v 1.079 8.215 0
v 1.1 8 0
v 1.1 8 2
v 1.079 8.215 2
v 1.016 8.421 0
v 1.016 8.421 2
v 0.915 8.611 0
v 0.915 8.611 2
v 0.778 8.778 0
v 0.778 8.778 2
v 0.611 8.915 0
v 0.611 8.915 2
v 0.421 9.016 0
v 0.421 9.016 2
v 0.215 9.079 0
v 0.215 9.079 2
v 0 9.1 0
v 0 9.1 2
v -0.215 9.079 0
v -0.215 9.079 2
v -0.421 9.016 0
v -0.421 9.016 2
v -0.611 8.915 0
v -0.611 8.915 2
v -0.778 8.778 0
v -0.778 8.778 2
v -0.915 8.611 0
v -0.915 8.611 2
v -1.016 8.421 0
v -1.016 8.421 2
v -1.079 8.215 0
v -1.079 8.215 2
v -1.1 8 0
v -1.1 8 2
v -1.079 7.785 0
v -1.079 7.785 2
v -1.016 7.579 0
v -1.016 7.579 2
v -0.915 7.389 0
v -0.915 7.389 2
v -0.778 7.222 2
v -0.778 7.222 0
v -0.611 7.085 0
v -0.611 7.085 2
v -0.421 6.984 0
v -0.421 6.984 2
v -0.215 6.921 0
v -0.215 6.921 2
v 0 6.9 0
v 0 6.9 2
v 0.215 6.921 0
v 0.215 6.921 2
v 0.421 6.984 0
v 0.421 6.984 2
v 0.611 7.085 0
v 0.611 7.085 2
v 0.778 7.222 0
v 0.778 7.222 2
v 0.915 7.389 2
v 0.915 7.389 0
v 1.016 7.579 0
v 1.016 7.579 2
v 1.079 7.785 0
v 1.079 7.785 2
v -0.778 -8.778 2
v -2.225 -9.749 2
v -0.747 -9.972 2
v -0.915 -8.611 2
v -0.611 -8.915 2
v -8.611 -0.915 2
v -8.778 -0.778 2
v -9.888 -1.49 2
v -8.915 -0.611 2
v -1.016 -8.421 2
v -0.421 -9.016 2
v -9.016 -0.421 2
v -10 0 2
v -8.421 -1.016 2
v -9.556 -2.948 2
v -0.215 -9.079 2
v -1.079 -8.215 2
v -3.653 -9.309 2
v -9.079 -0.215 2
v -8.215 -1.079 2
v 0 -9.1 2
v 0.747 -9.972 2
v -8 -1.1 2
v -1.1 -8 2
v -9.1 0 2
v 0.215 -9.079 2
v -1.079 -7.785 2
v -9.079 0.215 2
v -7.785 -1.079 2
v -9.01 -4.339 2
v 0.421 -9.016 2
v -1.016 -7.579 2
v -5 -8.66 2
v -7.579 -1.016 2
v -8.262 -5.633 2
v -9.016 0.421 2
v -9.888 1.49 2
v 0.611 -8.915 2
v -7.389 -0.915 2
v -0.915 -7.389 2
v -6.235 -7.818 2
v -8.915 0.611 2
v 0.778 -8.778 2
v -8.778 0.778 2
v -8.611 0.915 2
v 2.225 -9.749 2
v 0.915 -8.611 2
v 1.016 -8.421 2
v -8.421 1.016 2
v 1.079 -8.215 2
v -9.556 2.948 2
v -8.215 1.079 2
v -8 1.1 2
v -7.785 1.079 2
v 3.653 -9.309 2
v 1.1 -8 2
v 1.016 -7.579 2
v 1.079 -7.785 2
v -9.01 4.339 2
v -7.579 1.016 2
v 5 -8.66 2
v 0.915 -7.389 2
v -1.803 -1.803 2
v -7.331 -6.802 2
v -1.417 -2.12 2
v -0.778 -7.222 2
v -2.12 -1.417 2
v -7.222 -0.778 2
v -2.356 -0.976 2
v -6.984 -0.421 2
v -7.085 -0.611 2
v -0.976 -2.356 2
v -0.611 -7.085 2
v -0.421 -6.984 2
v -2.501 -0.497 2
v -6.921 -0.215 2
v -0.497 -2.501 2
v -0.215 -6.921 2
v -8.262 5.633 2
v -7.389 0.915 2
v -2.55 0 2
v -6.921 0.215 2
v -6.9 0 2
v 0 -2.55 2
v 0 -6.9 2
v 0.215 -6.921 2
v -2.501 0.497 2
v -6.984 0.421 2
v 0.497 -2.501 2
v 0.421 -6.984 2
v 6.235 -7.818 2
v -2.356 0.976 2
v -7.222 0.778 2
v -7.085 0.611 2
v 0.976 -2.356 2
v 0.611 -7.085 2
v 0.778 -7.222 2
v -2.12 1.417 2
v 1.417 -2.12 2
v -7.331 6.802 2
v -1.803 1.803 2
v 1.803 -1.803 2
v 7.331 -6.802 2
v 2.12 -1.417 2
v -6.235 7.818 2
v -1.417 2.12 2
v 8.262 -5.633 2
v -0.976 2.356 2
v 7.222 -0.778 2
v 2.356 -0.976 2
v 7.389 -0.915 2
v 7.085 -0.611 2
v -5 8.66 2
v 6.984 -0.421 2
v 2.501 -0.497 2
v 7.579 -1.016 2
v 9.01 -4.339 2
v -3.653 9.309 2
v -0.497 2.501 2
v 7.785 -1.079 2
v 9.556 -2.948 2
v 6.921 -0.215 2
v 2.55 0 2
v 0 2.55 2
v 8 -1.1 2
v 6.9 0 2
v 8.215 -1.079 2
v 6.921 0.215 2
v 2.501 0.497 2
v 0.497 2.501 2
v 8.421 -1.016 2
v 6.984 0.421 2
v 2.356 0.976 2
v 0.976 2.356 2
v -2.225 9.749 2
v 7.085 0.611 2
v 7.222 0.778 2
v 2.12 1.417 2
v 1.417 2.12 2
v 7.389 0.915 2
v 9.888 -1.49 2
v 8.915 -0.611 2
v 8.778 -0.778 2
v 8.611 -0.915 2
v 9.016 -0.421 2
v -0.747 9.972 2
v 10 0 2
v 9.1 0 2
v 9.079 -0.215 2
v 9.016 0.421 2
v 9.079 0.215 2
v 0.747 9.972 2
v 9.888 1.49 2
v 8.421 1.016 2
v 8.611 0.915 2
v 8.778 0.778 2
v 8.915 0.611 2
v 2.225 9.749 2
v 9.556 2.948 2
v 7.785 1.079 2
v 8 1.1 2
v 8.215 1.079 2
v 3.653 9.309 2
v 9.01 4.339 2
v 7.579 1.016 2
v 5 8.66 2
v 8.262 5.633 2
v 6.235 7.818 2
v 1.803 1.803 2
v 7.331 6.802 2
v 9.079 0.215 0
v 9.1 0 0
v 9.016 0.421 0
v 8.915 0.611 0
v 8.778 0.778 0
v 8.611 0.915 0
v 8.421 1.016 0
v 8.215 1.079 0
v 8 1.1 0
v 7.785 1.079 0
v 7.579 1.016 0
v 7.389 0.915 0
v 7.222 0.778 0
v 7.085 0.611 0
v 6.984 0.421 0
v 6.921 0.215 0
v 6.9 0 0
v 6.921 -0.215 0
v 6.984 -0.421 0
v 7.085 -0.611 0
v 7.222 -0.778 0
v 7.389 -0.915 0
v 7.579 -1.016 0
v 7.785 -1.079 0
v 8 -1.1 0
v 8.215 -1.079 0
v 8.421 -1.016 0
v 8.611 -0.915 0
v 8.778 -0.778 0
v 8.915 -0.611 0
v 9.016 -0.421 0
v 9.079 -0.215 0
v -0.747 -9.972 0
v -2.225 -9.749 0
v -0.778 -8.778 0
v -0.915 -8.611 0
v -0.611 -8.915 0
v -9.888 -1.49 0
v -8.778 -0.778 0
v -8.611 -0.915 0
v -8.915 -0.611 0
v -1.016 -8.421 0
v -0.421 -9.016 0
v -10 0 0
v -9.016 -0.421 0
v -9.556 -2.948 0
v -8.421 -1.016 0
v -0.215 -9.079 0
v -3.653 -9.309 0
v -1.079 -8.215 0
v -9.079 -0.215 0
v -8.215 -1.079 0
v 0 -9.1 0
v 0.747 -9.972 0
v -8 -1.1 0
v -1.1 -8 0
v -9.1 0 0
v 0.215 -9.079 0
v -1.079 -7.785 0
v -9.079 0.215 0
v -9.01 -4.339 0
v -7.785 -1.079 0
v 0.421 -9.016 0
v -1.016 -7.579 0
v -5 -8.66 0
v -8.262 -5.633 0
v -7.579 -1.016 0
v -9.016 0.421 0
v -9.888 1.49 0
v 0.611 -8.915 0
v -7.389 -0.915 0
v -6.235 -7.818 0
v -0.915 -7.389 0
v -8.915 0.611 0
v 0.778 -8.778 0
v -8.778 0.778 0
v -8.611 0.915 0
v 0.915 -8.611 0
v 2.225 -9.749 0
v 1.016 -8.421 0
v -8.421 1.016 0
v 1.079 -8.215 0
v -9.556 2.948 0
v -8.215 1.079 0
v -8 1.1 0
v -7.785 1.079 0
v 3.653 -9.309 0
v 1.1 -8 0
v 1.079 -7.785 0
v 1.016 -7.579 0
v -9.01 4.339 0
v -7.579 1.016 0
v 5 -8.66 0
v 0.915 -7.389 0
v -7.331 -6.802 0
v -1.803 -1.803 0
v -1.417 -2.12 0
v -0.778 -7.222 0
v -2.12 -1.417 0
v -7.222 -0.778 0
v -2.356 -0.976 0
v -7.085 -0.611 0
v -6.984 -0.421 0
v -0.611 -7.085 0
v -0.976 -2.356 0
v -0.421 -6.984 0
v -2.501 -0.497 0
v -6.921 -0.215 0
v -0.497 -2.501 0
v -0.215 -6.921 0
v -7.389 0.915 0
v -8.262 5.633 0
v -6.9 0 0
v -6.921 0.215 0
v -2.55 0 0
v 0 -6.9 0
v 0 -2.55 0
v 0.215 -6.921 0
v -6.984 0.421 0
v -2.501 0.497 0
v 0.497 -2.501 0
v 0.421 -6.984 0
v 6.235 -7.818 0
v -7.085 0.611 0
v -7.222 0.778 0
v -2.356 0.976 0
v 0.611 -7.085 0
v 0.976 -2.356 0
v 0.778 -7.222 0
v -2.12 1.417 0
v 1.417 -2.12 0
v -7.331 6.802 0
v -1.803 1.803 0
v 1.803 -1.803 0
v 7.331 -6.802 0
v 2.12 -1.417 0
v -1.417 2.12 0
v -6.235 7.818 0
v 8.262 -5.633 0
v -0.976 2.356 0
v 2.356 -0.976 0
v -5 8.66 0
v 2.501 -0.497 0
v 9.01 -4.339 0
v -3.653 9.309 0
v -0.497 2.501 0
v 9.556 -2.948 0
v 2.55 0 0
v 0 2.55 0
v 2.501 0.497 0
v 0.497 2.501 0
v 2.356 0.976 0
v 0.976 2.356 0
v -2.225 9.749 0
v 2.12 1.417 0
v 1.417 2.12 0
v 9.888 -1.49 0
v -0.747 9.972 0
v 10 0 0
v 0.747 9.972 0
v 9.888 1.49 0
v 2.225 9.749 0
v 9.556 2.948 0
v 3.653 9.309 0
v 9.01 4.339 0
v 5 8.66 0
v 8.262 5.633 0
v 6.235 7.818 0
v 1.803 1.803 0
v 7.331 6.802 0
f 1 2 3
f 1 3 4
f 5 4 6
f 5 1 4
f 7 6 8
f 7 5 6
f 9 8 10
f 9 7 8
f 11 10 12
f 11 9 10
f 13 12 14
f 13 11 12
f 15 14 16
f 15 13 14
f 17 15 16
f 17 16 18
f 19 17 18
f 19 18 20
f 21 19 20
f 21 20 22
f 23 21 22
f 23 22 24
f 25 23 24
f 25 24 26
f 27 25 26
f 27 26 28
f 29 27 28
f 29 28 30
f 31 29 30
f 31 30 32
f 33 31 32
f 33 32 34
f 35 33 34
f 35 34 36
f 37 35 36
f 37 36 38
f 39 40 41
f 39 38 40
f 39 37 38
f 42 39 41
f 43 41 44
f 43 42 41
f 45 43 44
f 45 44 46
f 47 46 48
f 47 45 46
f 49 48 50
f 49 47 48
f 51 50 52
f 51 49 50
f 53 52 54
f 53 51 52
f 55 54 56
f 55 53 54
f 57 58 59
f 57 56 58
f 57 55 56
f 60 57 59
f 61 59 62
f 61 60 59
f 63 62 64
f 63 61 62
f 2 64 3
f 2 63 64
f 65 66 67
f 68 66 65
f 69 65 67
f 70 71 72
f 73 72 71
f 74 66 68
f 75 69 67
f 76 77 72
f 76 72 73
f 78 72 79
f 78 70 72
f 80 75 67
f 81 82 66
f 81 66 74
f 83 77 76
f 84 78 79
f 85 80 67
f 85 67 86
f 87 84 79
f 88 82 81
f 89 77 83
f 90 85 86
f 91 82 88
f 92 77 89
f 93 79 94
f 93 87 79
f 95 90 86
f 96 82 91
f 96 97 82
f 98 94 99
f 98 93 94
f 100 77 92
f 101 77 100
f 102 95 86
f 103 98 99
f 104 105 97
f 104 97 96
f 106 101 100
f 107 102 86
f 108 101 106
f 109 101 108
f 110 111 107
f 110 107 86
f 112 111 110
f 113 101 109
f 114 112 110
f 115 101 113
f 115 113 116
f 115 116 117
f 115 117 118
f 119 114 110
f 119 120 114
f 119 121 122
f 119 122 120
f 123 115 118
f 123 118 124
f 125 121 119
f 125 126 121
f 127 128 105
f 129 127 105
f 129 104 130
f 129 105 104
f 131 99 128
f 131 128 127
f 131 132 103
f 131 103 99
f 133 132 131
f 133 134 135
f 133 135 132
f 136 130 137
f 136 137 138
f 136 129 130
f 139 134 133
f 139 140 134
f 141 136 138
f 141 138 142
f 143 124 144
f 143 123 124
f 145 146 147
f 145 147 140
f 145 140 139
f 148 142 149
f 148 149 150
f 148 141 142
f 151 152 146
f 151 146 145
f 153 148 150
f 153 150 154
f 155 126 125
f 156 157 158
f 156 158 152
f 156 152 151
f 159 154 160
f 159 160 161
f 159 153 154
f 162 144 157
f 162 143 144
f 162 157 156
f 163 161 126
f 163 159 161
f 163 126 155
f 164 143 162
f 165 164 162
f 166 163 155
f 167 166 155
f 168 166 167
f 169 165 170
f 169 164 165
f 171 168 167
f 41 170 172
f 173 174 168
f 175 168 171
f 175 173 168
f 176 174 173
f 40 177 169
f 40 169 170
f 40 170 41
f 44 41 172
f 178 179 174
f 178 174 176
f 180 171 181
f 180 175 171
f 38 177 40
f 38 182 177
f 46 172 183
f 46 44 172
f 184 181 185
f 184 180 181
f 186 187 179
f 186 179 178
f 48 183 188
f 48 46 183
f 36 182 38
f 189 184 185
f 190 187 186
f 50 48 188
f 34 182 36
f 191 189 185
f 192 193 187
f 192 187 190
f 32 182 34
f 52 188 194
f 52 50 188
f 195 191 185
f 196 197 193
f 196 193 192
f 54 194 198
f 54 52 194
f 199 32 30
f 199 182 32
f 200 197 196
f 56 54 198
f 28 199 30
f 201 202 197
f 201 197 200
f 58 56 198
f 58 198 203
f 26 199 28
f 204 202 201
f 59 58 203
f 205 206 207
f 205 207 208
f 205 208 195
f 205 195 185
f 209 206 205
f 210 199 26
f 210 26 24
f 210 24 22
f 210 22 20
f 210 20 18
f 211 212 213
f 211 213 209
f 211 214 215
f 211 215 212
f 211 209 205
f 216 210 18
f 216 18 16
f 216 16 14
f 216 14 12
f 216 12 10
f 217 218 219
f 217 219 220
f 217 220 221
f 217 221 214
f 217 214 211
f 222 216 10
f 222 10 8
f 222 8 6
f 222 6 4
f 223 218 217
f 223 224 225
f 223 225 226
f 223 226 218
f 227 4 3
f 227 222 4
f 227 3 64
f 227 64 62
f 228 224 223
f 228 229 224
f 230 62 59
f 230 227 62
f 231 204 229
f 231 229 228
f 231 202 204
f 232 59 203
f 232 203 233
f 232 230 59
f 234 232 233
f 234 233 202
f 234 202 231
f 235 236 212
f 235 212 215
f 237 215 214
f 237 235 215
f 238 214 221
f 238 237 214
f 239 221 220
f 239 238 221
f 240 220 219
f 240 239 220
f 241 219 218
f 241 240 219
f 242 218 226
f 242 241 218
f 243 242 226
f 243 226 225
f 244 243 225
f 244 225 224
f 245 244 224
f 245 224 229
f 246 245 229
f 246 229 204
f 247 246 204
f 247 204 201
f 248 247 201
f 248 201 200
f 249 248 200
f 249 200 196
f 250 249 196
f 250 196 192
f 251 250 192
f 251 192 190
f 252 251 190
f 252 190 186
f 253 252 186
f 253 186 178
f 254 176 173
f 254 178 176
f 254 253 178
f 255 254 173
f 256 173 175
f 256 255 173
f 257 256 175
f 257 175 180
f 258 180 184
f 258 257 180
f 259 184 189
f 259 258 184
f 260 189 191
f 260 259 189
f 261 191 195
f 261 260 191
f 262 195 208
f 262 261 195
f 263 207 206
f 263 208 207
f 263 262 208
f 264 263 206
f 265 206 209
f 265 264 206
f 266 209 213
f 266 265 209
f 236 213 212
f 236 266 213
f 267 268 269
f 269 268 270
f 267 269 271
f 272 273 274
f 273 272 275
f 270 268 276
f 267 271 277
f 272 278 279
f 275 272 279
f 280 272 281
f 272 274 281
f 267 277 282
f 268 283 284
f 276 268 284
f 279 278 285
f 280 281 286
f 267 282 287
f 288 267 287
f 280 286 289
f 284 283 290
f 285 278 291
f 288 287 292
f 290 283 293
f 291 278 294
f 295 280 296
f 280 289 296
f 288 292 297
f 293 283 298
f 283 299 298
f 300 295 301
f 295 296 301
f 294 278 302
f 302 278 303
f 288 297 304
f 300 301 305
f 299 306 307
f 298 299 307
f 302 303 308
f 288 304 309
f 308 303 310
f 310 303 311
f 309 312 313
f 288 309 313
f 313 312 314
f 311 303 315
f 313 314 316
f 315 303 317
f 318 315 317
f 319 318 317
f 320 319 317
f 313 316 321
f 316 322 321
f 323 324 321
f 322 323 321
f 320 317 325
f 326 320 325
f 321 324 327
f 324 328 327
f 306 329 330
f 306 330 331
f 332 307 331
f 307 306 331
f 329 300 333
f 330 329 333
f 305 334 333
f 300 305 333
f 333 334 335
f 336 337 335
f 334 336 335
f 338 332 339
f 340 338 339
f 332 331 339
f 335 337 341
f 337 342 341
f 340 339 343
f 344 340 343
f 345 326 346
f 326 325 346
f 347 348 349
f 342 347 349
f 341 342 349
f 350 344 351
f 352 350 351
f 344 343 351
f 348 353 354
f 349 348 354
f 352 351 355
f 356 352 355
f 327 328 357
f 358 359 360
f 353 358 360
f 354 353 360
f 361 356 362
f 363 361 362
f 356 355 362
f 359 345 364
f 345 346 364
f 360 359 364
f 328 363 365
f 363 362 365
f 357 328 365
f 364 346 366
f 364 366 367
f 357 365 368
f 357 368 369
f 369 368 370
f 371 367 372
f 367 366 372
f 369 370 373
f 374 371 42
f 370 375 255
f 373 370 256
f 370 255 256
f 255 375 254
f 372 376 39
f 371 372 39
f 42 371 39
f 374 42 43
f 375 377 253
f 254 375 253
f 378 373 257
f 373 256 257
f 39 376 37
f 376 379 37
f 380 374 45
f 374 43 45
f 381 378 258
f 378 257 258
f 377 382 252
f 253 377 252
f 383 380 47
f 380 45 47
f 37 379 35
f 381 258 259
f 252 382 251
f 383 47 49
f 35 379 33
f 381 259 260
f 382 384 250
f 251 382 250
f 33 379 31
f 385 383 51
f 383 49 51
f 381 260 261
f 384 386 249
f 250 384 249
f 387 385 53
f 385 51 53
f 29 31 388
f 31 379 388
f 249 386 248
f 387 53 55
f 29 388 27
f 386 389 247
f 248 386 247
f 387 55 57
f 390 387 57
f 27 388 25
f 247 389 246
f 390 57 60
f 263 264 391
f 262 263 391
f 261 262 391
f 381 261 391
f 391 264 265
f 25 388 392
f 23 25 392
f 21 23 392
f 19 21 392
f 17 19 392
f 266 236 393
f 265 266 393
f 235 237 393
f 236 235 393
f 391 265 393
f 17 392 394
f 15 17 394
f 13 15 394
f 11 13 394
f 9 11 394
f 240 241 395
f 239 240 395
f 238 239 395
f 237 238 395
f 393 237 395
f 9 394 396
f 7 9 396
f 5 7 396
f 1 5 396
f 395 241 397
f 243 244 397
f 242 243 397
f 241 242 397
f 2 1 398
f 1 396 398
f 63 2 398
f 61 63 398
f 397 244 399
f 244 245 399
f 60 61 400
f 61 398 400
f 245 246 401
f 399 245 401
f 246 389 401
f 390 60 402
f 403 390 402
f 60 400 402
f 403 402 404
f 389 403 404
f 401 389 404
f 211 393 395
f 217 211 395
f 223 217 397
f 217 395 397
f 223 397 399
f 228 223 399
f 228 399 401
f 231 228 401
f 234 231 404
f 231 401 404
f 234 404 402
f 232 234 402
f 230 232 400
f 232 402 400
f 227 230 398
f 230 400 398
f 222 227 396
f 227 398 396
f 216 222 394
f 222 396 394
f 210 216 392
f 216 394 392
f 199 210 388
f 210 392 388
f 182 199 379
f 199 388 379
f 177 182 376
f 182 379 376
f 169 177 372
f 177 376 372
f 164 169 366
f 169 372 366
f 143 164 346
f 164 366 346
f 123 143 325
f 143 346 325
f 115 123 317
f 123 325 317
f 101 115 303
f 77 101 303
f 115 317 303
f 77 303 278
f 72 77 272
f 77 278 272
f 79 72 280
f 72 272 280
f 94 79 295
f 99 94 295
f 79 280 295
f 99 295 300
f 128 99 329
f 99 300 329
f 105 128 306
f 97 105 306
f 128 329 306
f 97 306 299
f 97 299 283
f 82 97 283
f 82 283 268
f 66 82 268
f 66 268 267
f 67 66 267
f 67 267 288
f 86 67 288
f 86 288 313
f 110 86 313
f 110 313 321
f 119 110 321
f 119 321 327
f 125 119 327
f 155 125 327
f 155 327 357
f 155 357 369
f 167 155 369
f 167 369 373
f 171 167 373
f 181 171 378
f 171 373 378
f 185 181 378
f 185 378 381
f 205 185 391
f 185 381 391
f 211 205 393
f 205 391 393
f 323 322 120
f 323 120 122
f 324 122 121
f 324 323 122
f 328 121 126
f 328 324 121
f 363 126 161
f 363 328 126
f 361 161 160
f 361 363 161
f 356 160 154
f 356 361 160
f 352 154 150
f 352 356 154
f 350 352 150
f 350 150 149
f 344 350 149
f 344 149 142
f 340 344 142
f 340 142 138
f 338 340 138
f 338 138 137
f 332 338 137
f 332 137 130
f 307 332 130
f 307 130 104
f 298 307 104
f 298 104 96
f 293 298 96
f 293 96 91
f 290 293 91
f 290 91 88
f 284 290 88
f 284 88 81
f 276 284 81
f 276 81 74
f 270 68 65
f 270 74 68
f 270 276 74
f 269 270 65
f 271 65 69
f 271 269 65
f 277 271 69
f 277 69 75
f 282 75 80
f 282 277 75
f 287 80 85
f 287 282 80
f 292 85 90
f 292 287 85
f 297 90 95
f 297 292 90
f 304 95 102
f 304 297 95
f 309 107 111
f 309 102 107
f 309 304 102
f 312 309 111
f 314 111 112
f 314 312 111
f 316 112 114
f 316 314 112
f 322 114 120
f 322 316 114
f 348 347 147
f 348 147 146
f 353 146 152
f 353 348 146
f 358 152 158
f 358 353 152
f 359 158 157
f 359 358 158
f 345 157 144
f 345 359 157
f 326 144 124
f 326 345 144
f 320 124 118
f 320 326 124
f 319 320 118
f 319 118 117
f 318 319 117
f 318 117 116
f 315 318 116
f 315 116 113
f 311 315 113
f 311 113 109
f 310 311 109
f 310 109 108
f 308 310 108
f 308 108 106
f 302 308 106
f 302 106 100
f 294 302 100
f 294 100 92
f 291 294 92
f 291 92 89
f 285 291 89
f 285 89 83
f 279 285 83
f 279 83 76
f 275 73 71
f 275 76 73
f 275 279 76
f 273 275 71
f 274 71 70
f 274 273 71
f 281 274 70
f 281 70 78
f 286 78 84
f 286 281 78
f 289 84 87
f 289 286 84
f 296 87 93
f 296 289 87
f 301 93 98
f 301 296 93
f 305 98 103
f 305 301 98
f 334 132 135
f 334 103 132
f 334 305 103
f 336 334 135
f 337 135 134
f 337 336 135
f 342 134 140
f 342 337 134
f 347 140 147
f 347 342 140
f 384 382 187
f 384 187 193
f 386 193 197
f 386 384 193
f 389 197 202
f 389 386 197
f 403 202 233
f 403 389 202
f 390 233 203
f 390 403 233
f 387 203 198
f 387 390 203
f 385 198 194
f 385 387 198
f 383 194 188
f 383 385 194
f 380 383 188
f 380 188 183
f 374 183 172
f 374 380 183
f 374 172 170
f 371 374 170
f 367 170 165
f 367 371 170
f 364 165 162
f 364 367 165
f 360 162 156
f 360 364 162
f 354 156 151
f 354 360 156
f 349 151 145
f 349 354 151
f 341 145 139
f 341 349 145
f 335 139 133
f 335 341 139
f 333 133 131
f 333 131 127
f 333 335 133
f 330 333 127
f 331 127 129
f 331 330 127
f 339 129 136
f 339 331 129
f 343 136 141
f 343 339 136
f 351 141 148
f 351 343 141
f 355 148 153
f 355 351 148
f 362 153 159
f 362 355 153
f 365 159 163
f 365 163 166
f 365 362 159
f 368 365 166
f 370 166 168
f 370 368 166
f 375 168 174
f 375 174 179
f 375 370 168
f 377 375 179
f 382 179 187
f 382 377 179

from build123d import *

# Parameters (mm, degrees)
HORN_PLATE_ENVELOPE_PROFILE_R           = 10
HORN_PLATE_ENVELOPE_PROFILE_R_2         = 2.55
HORN_PLATE_ENVELOPE_DEPTH               = 2
NOMINAL_HORN_ATTACHMENT_HOLES_START     = -50
NOMINAL_HORN_ATTACHMENT_HOLES_PROFILE_R = 1.1
NOMINAL_HORN_ATTACHMENT_HOLES_DEPTH     = 65.282856857


with BuildPart() as part:
    # Horn_plate_envelope_profile → Horn_plate_envelope (new body)
    with BuildSketch(Plane.XY):
        Circle(HORN_PLATE_ENVELOPE_PROFILE_R)
        Circle(HORN_PLATE_ENVELOPE_PROFILE_R_2, mode=Mode.SUBTRACT)
    extrude(amount=HORN_PLATE_ENVELOPE_DEPTH)

    # Nominal_horn_attachment_holes_profile → Nominal_horn_attachment_holes (cut, through all)
    with BuildSketch(Plane.XY.offset(NOMINAL_HORN_ATTACHMENT_HOLES_START)):
        with Locations((-8, 0)):
            Circle(NOMINAL_HORN_ATTACHMENT_HOLES_PROFILE_R)
        with Locations((8, 0)):
            Circle(NOMINAL_HORN_ATTACHMENT_HOLES_PROFILE_R)
        with Locations((0, -8)):
            Circle(NOMINAL_HORN_ATTACHMENT_HOLES_PROFILE_R)
        with Locations((0, 8)):
            Circle(NOMINAL_HORN_ATTACHMENT_HOLES_PROFILE_R)
    extrude(amount=NOMINAL_HORN_ATTACHMENT_HOLES_DEPTH, mode=Mode.SUBTRACT)


solid = part.part
